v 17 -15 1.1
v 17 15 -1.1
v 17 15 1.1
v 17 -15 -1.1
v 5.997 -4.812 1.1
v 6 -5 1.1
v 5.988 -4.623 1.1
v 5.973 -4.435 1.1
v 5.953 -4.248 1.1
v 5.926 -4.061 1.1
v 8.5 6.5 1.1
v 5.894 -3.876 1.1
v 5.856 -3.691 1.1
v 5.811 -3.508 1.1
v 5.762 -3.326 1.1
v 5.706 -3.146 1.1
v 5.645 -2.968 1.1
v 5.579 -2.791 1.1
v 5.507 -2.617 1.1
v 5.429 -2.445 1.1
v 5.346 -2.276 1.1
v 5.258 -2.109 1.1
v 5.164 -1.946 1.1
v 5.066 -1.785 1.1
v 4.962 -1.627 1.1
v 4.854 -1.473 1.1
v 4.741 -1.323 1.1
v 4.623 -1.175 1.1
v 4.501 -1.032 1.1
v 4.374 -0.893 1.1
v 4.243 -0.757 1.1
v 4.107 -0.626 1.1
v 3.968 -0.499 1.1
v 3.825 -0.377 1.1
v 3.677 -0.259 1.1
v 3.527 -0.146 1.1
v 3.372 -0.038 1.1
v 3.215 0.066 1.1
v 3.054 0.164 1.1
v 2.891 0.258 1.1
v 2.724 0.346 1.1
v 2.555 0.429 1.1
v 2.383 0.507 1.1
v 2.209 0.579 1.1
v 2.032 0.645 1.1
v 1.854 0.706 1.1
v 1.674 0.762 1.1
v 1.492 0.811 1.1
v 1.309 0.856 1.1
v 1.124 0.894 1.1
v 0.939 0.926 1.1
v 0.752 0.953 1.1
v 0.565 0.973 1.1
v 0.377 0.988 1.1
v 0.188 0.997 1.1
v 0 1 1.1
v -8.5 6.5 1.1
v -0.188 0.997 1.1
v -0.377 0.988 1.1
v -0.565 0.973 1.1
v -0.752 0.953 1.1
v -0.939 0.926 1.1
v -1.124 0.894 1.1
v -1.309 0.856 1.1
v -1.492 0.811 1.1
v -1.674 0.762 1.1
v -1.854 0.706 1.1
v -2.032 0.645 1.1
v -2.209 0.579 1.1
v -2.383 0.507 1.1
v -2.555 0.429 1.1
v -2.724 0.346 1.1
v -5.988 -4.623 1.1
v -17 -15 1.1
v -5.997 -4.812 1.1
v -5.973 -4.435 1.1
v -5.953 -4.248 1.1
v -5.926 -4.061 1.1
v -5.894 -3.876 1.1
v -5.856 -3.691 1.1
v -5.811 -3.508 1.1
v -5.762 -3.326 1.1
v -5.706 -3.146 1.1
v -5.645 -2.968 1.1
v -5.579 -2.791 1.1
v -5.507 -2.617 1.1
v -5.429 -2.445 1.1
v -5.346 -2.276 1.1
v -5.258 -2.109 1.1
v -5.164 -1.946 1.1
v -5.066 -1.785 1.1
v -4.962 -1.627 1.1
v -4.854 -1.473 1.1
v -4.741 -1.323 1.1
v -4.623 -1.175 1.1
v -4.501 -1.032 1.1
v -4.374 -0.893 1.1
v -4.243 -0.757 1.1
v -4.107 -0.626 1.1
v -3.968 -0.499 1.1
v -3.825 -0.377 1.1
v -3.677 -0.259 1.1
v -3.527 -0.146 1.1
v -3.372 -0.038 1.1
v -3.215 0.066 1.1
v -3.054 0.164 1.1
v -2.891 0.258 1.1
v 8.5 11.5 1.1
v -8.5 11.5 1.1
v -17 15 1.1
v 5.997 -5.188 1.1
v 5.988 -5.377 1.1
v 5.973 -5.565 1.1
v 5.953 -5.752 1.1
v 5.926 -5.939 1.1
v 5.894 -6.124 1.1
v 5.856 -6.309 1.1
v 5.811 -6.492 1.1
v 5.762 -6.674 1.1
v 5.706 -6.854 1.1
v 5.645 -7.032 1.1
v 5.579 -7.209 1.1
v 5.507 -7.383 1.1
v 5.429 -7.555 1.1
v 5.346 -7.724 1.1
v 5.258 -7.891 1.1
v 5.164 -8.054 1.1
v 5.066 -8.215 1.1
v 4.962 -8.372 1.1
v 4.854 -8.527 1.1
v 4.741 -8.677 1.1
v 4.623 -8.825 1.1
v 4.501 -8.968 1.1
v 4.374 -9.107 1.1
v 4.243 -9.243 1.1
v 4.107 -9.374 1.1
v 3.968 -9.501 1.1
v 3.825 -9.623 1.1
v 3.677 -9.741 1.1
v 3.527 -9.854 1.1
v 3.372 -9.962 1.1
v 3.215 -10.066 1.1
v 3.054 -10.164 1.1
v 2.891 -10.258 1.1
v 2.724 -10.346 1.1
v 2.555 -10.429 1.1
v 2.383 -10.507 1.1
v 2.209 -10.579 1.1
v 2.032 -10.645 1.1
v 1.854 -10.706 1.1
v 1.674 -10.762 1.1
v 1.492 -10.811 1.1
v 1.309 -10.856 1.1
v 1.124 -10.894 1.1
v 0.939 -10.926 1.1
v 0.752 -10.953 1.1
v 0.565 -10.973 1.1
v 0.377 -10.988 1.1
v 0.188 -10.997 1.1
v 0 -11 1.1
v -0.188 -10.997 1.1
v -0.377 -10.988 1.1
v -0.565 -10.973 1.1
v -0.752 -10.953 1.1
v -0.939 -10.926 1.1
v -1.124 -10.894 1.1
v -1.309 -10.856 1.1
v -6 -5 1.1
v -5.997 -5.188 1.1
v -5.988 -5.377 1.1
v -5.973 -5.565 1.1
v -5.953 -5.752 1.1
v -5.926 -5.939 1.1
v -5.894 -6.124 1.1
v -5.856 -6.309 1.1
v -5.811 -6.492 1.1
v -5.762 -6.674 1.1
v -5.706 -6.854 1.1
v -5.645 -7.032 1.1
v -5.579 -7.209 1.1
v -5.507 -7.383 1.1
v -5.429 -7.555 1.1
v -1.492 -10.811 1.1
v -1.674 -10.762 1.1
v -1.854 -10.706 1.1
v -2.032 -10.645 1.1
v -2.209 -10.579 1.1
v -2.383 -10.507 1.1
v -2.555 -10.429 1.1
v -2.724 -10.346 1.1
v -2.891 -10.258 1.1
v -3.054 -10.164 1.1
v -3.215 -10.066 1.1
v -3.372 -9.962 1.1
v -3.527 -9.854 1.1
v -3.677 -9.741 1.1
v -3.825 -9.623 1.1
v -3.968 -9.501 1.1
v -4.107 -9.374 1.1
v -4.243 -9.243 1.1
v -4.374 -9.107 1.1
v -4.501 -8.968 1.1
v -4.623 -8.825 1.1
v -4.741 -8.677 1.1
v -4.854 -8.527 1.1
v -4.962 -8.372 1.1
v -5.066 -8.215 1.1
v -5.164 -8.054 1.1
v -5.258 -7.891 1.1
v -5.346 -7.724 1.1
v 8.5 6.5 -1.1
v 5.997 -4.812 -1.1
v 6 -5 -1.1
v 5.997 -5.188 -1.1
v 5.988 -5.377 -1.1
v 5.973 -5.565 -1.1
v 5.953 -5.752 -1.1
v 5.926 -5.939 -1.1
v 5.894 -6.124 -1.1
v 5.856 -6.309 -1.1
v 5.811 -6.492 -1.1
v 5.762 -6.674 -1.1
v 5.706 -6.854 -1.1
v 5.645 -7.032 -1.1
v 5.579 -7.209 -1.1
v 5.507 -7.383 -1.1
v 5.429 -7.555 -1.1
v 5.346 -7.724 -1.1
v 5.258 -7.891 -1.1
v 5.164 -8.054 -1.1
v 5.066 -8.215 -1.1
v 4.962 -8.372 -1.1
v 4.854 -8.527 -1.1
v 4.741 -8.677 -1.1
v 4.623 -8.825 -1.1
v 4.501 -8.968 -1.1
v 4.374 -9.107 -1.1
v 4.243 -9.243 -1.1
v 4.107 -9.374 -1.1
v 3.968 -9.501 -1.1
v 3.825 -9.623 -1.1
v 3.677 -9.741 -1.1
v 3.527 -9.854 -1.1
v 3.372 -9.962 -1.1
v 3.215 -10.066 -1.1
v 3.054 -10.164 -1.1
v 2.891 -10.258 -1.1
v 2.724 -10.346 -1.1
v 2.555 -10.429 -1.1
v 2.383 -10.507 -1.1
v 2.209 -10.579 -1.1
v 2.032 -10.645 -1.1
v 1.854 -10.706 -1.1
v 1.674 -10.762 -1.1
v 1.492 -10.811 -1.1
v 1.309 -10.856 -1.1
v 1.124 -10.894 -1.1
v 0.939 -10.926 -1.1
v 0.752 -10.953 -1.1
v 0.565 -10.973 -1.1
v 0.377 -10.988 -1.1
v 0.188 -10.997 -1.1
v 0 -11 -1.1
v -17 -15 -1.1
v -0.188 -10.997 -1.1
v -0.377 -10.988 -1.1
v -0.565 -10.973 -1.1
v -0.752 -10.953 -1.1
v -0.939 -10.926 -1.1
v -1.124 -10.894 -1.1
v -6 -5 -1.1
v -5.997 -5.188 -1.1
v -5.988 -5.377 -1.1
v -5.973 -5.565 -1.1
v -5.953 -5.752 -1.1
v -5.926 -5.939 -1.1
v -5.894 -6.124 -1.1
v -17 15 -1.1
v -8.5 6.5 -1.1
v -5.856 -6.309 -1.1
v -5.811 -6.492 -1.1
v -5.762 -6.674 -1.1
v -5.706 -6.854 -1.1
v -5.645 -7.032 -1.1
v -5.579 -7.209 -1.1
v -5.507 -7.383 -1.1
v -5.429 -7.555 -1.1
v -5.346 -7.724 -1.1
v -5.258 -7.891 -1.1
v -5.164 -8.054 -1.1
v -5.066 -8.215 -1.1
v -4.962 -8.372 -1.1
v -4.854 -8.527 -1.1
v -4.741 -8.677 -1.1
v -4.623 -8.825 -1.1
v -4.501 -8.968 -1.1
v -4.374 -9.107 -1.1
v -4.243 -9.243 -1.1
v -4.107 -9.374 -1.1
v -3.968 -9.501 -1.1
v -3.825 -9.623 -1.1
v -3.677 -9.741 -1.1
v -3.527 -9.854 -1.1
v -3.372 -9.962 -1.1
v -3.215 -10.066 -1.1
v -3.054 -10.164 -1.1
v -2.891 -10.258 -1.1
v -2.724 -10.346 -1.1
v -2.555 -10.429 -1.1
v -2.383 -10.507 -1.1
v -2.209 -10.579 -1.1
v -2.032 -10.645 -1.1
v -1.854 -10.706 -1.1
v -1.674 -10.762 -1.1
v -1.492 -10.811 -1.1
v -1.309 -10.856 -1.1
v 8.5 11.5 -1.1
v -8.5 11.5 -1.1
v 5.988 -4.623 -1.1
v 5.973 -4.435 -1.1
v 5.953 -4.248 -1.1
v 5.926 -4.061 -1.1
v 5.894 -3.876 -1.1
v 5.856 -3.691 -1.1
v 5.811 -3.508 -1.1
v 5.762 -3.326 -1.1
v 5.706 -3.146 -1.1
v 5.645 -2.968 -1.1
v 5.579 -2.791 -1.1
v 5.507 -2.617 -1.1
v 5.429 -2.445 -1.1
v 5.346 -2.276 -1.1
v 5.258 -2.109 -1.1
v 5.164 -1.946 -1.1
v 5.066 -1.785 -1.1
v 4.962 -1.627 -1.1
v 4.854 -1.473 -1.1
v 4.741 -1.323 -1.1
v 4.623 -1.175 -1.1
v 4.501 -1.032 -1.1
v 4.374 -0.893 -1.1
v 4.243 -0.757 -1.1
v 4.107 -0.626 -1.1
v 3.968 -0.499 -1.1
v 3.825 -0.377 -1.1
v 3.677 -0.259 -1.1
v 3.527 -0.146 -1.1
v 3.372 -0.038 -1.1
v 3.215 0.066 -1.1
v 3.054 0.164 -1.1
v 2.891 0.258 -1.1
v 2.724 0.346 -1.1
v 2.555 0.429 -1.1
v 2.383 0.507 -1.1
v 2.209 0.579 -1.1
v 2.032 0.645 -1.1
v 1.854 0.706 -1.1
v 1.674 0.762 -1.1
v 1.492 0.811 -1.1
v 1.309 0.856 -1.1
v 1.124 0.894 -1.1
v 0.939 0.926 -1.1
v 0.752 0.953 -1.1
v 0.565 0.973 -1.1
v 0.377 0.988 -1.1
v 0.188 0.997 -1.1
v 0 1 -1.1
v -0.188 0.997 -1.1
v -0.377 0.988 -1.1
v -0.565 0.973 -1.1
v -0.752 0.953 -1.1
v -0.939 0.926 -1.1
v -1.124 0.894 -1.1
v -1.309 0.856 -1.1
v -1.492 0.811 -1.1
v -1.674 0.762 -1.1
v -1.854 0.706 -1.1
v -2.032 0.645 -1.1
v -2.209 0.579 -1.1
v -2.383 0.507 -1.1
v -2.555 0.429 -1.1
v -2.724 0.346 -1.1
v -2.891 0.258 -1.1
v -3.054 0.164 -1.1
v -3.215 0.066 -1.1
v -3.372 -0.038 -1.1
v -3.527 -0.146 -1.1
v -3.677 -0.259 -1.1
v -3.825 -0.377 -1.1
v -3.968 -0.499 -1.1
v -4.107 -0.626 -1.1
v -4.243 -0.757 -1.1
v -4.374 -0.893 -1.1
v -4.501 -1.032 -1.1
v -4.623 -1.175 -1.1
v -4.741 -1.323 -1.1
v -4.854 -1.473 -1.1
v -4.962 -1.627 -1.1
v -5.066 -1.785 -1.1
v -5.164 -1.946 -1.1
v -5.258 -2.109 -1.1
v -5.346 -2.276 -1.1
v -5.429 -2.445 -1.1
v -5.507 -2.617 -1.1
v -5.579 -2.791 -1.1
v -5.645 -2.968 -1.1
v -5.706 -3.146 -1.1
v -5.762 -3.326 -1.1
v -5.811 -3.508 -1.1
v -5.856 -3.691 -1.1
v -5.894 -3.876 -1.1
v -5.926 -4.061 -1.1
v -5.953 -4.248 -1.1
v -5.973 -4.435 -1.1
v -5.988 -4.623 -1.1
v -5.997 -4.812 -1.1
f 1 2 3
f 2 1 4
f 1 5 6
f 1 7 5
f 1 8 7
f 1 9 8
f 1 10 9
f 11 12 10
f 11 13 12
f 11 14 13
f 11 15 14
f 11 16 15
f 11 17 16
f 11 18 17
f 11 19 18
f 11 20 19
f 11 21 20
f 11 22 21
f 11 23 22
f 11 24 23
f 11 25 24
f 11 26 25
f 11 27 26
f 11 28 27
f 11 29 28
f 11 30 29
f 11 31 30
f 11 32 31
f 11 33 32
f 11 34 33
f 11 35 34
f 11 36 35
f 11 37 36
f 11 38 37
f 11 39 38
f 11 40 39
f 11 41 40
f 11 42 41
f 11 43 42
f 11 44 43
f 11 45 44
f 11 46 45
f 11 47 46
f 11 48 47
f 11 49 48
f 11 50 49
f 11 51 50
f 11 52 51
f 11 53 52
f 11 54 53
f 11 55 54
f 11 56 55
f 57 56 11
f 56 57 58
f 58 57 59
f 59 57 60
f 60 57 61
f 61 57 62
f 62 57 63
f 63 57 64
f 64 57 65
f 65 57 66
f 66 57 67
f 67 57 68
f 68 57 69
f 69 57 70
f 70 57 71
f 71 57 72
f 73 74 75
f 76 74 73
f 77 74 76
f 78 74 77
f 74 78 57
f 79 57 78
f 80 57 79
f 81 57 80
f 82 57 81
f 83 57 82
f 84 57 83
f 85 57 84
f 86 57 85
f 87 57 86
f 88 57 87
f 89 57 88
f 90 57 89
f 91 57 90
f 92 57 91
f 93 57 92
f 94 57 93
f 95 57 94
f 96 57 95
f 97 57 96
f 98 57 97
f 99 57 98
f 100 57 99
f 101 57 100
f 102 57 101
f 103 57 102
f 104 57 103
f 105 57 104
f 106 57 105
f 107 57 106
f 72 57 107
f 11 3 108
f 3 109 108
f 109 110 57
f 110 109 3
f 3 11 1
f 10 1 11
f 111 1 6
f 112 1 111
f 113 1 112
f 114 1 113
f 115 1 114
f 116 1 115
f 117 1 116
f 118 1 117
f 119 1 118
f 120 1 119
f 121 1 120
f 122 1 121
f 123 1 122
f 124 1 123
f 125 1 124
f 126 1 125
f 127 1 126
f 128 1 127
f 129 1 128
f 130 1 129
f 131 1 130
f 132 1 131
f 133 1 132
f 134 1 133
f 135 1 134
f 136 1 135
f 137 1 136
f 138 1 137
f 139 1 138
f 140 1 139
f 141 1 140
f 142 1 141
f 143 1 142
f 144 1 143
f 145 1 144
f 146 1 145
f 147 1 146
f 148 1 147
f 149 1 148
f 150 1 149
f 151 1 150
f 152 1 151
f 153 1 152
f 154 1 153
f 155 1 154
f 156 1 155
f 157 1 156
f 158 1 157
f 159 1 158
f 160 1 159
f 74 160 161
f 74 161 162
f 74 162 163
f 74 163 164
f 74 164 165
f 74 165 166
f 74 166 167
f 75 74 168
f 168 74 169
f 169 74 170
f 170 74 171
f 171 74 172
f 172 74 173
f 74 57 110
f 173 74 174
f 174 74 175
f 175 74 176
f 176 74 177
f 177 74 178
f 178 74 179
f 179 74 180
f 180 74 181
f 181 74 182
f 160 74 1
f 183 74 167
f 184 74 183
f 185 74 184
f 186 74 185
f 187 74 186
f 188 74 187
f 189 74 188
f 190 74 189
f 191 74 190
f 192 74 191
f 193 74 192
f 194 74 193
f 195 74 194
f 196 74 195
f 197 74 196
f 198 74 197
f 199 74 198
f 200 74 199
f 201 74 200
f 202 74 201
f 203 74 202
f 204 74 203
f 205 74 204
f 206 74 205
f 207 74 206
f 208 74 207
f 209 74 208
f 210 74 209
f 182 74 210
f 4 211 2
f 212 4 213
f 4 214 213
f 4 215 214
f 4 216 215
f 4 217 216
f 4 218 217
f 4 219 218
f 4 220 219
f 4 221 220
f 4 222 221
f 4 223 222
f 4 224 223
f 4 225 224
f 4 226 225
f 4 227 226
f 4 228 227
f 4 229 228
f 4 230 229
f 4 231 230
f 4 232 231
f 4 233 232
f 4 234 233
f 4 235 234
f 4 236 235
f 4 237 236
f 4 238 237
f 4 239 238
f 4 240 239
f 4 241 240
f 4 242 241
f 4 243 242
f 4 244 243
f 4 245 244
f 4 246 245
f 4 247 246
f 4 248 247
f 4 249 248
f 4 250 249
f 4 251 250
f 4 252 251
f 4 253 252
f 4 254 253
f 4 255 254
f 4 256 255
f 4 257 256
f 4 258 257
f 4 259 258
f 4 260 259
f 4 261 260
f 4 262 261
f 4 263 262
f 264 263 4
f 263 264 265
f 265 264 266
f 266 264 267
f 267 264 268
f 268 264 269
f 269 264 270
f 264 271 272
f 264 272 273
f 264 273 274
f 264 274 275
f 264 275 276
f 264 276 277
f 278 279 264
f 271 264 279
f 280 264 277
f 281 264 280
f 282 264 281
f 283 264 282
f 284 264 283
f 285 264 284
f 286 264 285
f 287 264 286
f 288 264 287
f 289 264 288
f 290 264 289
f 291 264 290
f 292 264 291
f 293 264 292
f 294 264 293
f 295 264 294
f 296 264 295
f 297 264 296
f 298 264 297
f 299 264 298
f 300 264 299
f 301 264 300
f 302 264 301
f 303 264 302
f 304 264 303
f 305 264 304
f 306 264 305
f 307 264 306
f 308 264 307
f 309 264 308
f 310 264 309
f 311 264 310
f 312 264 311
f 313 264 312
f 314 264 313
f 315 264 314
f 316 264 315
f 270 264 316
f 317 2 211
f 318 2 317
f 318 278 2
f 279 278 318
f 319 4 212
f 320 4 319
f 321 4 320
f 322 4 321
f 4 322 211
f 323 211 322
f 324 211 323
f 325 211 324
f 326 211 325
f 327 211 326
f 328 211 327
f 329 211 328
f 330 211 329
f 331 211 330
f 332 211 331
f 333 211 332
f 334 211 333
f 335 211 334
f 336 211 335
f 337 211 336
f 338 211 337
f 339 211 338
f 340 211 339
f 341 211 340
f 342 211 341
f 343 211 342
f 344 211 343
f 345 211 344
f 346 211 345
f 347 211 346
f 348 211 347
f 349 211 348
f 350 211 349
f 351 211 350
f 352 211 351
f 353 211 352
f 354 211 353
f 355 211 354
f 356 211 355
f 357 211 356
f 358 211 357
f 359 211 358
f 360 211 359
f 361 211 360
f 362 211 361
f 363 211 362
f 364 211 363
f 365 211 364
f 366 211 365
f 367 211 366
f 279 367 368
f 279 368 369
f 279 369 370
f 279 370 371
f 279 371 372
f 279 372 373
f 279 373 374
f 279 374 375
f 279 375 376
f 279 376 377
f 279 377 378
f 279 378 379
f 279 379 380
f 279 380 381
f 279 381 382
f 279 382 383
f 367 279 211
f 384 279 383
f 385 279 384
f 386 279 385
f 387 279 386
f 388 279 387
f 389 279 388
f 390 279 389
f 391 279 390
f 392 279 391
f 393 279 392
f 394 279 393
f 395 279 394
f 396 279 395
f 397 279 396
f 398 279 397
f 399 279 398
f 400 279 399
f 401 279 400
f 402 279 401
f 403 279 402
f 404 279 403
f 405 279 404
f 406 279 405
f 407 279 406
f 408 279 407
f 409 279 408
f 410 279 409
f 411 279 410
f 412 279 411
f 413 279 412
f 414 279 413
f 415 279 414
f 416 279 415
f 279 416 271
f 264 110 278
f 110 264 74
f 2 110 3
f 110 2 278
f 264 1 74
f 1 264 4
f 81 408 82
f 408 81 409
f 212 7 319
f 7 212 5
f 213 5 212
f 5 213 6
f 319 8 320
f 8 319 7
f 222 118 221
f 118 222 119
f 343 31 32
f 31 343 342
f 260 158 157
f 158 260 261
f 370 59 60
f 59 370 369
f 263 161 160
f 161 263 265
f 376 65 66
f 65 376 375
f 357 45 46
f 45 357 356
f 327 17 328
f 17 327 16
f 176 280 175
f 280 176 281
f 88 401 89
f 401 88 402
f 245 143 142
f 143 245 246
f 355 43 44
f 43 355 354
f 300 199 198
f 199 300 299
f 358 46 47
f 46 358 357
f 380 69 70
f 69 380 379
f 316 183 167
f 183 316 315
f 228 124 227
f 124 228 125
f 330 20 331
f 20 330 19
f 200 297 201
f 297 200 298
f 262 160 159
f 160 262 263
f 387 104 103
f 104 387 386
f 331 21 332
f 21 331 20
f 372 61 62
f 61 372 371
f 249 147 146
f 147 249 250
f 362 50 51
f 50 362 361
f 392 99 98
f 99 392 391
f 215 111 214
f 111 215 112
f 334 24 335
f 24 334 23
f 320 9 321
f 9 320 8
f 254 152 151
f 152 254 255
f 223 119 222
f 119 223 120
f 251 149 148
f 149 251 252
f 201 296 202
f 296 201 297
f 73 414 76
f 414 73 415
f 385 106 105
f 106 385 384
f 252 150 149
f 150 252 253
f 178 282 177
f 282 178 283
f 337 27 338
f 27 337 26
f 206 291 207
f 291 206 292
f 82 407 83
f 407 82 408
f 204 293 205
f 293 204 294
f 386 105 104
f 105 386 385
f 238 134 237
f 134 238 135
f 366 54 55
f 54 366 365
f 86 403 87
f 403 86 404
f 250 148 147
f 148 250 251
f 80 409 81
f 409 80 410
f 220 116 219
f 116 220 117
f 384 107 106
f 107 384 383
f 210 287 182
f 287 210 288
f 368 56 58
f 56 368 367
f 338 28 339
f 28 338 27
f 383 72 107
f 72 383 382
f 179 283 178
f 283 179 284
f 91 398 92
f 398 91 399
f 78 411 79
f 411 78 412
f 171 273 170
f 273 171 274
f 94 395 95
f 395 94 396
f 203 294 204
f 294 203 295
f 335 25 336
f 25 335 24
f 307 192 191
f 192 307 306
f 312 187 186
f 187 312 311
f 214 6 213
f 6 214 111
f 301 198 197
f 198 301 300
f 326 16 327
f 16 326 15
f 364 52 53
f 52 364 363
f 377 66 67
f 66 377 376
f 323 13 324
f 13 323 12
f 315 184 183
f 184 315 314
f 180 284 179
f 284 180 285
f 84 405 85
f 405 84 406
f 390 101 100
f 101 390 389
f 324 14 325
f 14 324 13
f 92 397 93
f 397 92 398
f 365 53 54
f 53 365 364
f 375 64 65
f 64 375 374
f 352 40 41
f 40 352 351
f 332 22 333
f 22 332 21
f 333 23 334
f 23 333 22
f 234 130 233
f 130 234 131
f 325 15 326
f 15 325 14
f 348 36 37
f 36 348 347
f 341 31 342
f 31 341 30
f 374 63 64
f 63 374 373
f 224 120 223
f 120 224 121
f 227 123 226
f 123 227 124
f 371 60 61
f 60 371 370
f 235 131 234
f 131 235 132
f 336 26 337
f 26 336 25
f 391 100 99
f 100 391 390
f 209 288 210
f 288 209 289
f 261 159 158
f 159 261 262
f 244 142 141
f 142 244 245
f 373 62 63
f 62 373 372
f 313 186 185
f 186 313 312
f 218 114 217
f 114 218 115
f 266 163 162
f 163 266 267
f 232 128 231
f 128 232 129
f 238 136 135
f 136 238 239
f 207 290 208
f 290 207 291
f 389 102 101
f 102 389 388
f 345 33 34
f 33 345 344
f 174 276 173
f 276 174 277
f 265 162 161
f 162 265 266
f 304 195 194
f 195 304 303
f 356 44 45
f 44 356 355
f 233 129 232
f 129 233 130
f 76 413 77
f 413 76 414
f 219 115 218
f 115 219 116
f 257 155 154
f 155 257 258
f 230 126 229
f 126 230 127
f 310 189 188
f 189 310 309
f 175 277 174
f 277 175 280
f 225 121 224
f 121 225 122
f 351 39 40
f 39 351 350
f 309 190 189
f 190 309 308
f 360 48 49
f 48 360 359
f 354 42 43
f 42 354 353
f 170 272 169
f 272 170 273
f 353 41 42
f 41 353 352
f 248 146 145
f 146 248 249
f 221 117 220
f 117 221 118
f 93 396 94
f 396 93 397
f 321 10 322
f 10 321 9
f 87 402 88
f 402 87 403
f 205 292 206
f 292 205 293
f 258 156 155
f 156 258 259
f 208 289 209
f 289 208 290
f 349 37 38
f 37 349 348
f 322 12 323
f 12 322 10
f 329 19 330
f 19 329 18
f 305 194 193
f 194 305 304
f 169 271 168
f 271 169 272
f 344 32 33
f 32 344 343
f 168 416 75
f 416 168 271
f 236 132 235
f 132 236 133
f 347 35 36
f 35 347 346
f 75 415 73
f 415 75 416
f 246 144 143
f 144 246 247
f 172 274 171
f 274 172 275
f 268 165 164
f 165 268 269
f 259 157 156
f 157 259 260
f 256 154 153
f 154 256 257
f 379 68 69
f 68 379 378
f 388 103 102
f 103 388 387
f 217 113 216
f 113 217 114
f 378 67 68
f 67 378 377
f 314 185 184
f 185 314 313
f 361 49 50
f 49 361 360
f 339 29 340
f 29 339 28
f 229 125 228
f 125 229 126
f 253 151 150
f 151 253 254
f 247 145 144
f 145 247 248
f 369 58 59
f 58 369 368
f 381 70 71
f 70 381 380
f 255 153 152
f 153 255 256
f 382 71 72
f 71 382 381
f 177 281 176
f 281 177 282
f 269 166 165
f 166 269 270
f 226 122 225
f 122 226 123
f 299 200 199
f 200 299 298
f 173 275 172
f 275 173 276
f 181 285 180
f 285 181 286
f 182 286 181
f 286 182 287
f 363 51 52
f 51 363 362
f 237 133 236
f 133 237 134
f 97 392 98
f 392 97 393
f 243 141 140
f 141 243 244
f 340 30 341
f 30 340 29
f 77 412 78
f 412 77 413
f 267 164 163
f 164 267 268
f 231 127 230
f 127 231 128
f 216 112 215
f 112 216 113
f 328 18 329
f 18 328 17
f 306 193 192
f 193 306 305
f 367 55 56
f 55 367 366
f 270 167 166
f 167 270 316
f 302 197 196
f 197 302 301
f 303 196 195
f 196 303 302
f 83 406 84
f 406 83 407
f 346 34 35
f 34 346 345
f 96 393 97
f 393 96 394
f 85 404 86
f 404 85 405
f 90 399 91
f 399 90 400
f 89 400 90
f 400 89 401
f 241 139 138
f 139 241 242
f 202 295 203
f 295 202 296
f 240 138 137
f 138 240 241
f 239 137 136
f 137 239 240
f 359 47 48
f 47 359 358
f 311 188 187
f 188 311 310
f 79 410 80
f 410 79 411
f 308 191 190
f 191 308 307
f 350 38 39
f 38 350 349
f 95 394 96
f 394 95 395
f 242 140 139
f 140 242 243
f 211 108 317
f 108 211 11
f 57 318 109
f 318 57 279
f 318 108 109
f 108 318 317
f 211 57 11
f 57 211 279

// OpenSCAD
base_d = 85;
base_h = 20;

box_len = base_d;
box_width = 23;

rotor_d = 30;
rotor_h = 5;

hole_dist = 21;
hole_d = 2.5;

insert_width = 2.2;
insert_len = 34;
insert_height = base_h + 10;

$fn = 200;

module centry() {
//	union() {
	difference() {
		// base body
		cylinder(d = base_d, h = base_h);


		translate([0, 0, rotor_h]) {
			cylinder(d = rotor_d, h = base_h);
    }

		for(i=[0: 6]) {
			// Rotor mount holes
			rotate([0, 0, i*360/6]) {
				translate([0, hole_dist/2, -0.1])
					cylinder(d = hole_d, h = 6.1);
			}
		}
		for(i=[0: 4]) {
			rotate([0, 0, i*360/4]) {
				translate([-box_width/2, rotor_d/2+3, rotor_h]) {
					cube([box_width, box_len, base_h]);
        }
				translate([-insert_len/2, rotor_d/2+10, rotor_h]) {
					cube([insert_len+1, insert_width+1, base_h]);
        }
			}
		}
	}
}

module insert_plate(d) {
	difference()  {
		cube([insert_len, insert_height, insert_width], center=true);
		translate([0, -5, 0])
			cylinder(d=d, h=insert_width*2, center=true);
		translate([0, insert_height/2-6, 0])
			cube([insert_len/2, 5, insert_width*2], center=true);
	}
}


//centry();

//insert_plate(5);
//insert_plate(8);
insert_plate(12);
//insert_plate(15);
